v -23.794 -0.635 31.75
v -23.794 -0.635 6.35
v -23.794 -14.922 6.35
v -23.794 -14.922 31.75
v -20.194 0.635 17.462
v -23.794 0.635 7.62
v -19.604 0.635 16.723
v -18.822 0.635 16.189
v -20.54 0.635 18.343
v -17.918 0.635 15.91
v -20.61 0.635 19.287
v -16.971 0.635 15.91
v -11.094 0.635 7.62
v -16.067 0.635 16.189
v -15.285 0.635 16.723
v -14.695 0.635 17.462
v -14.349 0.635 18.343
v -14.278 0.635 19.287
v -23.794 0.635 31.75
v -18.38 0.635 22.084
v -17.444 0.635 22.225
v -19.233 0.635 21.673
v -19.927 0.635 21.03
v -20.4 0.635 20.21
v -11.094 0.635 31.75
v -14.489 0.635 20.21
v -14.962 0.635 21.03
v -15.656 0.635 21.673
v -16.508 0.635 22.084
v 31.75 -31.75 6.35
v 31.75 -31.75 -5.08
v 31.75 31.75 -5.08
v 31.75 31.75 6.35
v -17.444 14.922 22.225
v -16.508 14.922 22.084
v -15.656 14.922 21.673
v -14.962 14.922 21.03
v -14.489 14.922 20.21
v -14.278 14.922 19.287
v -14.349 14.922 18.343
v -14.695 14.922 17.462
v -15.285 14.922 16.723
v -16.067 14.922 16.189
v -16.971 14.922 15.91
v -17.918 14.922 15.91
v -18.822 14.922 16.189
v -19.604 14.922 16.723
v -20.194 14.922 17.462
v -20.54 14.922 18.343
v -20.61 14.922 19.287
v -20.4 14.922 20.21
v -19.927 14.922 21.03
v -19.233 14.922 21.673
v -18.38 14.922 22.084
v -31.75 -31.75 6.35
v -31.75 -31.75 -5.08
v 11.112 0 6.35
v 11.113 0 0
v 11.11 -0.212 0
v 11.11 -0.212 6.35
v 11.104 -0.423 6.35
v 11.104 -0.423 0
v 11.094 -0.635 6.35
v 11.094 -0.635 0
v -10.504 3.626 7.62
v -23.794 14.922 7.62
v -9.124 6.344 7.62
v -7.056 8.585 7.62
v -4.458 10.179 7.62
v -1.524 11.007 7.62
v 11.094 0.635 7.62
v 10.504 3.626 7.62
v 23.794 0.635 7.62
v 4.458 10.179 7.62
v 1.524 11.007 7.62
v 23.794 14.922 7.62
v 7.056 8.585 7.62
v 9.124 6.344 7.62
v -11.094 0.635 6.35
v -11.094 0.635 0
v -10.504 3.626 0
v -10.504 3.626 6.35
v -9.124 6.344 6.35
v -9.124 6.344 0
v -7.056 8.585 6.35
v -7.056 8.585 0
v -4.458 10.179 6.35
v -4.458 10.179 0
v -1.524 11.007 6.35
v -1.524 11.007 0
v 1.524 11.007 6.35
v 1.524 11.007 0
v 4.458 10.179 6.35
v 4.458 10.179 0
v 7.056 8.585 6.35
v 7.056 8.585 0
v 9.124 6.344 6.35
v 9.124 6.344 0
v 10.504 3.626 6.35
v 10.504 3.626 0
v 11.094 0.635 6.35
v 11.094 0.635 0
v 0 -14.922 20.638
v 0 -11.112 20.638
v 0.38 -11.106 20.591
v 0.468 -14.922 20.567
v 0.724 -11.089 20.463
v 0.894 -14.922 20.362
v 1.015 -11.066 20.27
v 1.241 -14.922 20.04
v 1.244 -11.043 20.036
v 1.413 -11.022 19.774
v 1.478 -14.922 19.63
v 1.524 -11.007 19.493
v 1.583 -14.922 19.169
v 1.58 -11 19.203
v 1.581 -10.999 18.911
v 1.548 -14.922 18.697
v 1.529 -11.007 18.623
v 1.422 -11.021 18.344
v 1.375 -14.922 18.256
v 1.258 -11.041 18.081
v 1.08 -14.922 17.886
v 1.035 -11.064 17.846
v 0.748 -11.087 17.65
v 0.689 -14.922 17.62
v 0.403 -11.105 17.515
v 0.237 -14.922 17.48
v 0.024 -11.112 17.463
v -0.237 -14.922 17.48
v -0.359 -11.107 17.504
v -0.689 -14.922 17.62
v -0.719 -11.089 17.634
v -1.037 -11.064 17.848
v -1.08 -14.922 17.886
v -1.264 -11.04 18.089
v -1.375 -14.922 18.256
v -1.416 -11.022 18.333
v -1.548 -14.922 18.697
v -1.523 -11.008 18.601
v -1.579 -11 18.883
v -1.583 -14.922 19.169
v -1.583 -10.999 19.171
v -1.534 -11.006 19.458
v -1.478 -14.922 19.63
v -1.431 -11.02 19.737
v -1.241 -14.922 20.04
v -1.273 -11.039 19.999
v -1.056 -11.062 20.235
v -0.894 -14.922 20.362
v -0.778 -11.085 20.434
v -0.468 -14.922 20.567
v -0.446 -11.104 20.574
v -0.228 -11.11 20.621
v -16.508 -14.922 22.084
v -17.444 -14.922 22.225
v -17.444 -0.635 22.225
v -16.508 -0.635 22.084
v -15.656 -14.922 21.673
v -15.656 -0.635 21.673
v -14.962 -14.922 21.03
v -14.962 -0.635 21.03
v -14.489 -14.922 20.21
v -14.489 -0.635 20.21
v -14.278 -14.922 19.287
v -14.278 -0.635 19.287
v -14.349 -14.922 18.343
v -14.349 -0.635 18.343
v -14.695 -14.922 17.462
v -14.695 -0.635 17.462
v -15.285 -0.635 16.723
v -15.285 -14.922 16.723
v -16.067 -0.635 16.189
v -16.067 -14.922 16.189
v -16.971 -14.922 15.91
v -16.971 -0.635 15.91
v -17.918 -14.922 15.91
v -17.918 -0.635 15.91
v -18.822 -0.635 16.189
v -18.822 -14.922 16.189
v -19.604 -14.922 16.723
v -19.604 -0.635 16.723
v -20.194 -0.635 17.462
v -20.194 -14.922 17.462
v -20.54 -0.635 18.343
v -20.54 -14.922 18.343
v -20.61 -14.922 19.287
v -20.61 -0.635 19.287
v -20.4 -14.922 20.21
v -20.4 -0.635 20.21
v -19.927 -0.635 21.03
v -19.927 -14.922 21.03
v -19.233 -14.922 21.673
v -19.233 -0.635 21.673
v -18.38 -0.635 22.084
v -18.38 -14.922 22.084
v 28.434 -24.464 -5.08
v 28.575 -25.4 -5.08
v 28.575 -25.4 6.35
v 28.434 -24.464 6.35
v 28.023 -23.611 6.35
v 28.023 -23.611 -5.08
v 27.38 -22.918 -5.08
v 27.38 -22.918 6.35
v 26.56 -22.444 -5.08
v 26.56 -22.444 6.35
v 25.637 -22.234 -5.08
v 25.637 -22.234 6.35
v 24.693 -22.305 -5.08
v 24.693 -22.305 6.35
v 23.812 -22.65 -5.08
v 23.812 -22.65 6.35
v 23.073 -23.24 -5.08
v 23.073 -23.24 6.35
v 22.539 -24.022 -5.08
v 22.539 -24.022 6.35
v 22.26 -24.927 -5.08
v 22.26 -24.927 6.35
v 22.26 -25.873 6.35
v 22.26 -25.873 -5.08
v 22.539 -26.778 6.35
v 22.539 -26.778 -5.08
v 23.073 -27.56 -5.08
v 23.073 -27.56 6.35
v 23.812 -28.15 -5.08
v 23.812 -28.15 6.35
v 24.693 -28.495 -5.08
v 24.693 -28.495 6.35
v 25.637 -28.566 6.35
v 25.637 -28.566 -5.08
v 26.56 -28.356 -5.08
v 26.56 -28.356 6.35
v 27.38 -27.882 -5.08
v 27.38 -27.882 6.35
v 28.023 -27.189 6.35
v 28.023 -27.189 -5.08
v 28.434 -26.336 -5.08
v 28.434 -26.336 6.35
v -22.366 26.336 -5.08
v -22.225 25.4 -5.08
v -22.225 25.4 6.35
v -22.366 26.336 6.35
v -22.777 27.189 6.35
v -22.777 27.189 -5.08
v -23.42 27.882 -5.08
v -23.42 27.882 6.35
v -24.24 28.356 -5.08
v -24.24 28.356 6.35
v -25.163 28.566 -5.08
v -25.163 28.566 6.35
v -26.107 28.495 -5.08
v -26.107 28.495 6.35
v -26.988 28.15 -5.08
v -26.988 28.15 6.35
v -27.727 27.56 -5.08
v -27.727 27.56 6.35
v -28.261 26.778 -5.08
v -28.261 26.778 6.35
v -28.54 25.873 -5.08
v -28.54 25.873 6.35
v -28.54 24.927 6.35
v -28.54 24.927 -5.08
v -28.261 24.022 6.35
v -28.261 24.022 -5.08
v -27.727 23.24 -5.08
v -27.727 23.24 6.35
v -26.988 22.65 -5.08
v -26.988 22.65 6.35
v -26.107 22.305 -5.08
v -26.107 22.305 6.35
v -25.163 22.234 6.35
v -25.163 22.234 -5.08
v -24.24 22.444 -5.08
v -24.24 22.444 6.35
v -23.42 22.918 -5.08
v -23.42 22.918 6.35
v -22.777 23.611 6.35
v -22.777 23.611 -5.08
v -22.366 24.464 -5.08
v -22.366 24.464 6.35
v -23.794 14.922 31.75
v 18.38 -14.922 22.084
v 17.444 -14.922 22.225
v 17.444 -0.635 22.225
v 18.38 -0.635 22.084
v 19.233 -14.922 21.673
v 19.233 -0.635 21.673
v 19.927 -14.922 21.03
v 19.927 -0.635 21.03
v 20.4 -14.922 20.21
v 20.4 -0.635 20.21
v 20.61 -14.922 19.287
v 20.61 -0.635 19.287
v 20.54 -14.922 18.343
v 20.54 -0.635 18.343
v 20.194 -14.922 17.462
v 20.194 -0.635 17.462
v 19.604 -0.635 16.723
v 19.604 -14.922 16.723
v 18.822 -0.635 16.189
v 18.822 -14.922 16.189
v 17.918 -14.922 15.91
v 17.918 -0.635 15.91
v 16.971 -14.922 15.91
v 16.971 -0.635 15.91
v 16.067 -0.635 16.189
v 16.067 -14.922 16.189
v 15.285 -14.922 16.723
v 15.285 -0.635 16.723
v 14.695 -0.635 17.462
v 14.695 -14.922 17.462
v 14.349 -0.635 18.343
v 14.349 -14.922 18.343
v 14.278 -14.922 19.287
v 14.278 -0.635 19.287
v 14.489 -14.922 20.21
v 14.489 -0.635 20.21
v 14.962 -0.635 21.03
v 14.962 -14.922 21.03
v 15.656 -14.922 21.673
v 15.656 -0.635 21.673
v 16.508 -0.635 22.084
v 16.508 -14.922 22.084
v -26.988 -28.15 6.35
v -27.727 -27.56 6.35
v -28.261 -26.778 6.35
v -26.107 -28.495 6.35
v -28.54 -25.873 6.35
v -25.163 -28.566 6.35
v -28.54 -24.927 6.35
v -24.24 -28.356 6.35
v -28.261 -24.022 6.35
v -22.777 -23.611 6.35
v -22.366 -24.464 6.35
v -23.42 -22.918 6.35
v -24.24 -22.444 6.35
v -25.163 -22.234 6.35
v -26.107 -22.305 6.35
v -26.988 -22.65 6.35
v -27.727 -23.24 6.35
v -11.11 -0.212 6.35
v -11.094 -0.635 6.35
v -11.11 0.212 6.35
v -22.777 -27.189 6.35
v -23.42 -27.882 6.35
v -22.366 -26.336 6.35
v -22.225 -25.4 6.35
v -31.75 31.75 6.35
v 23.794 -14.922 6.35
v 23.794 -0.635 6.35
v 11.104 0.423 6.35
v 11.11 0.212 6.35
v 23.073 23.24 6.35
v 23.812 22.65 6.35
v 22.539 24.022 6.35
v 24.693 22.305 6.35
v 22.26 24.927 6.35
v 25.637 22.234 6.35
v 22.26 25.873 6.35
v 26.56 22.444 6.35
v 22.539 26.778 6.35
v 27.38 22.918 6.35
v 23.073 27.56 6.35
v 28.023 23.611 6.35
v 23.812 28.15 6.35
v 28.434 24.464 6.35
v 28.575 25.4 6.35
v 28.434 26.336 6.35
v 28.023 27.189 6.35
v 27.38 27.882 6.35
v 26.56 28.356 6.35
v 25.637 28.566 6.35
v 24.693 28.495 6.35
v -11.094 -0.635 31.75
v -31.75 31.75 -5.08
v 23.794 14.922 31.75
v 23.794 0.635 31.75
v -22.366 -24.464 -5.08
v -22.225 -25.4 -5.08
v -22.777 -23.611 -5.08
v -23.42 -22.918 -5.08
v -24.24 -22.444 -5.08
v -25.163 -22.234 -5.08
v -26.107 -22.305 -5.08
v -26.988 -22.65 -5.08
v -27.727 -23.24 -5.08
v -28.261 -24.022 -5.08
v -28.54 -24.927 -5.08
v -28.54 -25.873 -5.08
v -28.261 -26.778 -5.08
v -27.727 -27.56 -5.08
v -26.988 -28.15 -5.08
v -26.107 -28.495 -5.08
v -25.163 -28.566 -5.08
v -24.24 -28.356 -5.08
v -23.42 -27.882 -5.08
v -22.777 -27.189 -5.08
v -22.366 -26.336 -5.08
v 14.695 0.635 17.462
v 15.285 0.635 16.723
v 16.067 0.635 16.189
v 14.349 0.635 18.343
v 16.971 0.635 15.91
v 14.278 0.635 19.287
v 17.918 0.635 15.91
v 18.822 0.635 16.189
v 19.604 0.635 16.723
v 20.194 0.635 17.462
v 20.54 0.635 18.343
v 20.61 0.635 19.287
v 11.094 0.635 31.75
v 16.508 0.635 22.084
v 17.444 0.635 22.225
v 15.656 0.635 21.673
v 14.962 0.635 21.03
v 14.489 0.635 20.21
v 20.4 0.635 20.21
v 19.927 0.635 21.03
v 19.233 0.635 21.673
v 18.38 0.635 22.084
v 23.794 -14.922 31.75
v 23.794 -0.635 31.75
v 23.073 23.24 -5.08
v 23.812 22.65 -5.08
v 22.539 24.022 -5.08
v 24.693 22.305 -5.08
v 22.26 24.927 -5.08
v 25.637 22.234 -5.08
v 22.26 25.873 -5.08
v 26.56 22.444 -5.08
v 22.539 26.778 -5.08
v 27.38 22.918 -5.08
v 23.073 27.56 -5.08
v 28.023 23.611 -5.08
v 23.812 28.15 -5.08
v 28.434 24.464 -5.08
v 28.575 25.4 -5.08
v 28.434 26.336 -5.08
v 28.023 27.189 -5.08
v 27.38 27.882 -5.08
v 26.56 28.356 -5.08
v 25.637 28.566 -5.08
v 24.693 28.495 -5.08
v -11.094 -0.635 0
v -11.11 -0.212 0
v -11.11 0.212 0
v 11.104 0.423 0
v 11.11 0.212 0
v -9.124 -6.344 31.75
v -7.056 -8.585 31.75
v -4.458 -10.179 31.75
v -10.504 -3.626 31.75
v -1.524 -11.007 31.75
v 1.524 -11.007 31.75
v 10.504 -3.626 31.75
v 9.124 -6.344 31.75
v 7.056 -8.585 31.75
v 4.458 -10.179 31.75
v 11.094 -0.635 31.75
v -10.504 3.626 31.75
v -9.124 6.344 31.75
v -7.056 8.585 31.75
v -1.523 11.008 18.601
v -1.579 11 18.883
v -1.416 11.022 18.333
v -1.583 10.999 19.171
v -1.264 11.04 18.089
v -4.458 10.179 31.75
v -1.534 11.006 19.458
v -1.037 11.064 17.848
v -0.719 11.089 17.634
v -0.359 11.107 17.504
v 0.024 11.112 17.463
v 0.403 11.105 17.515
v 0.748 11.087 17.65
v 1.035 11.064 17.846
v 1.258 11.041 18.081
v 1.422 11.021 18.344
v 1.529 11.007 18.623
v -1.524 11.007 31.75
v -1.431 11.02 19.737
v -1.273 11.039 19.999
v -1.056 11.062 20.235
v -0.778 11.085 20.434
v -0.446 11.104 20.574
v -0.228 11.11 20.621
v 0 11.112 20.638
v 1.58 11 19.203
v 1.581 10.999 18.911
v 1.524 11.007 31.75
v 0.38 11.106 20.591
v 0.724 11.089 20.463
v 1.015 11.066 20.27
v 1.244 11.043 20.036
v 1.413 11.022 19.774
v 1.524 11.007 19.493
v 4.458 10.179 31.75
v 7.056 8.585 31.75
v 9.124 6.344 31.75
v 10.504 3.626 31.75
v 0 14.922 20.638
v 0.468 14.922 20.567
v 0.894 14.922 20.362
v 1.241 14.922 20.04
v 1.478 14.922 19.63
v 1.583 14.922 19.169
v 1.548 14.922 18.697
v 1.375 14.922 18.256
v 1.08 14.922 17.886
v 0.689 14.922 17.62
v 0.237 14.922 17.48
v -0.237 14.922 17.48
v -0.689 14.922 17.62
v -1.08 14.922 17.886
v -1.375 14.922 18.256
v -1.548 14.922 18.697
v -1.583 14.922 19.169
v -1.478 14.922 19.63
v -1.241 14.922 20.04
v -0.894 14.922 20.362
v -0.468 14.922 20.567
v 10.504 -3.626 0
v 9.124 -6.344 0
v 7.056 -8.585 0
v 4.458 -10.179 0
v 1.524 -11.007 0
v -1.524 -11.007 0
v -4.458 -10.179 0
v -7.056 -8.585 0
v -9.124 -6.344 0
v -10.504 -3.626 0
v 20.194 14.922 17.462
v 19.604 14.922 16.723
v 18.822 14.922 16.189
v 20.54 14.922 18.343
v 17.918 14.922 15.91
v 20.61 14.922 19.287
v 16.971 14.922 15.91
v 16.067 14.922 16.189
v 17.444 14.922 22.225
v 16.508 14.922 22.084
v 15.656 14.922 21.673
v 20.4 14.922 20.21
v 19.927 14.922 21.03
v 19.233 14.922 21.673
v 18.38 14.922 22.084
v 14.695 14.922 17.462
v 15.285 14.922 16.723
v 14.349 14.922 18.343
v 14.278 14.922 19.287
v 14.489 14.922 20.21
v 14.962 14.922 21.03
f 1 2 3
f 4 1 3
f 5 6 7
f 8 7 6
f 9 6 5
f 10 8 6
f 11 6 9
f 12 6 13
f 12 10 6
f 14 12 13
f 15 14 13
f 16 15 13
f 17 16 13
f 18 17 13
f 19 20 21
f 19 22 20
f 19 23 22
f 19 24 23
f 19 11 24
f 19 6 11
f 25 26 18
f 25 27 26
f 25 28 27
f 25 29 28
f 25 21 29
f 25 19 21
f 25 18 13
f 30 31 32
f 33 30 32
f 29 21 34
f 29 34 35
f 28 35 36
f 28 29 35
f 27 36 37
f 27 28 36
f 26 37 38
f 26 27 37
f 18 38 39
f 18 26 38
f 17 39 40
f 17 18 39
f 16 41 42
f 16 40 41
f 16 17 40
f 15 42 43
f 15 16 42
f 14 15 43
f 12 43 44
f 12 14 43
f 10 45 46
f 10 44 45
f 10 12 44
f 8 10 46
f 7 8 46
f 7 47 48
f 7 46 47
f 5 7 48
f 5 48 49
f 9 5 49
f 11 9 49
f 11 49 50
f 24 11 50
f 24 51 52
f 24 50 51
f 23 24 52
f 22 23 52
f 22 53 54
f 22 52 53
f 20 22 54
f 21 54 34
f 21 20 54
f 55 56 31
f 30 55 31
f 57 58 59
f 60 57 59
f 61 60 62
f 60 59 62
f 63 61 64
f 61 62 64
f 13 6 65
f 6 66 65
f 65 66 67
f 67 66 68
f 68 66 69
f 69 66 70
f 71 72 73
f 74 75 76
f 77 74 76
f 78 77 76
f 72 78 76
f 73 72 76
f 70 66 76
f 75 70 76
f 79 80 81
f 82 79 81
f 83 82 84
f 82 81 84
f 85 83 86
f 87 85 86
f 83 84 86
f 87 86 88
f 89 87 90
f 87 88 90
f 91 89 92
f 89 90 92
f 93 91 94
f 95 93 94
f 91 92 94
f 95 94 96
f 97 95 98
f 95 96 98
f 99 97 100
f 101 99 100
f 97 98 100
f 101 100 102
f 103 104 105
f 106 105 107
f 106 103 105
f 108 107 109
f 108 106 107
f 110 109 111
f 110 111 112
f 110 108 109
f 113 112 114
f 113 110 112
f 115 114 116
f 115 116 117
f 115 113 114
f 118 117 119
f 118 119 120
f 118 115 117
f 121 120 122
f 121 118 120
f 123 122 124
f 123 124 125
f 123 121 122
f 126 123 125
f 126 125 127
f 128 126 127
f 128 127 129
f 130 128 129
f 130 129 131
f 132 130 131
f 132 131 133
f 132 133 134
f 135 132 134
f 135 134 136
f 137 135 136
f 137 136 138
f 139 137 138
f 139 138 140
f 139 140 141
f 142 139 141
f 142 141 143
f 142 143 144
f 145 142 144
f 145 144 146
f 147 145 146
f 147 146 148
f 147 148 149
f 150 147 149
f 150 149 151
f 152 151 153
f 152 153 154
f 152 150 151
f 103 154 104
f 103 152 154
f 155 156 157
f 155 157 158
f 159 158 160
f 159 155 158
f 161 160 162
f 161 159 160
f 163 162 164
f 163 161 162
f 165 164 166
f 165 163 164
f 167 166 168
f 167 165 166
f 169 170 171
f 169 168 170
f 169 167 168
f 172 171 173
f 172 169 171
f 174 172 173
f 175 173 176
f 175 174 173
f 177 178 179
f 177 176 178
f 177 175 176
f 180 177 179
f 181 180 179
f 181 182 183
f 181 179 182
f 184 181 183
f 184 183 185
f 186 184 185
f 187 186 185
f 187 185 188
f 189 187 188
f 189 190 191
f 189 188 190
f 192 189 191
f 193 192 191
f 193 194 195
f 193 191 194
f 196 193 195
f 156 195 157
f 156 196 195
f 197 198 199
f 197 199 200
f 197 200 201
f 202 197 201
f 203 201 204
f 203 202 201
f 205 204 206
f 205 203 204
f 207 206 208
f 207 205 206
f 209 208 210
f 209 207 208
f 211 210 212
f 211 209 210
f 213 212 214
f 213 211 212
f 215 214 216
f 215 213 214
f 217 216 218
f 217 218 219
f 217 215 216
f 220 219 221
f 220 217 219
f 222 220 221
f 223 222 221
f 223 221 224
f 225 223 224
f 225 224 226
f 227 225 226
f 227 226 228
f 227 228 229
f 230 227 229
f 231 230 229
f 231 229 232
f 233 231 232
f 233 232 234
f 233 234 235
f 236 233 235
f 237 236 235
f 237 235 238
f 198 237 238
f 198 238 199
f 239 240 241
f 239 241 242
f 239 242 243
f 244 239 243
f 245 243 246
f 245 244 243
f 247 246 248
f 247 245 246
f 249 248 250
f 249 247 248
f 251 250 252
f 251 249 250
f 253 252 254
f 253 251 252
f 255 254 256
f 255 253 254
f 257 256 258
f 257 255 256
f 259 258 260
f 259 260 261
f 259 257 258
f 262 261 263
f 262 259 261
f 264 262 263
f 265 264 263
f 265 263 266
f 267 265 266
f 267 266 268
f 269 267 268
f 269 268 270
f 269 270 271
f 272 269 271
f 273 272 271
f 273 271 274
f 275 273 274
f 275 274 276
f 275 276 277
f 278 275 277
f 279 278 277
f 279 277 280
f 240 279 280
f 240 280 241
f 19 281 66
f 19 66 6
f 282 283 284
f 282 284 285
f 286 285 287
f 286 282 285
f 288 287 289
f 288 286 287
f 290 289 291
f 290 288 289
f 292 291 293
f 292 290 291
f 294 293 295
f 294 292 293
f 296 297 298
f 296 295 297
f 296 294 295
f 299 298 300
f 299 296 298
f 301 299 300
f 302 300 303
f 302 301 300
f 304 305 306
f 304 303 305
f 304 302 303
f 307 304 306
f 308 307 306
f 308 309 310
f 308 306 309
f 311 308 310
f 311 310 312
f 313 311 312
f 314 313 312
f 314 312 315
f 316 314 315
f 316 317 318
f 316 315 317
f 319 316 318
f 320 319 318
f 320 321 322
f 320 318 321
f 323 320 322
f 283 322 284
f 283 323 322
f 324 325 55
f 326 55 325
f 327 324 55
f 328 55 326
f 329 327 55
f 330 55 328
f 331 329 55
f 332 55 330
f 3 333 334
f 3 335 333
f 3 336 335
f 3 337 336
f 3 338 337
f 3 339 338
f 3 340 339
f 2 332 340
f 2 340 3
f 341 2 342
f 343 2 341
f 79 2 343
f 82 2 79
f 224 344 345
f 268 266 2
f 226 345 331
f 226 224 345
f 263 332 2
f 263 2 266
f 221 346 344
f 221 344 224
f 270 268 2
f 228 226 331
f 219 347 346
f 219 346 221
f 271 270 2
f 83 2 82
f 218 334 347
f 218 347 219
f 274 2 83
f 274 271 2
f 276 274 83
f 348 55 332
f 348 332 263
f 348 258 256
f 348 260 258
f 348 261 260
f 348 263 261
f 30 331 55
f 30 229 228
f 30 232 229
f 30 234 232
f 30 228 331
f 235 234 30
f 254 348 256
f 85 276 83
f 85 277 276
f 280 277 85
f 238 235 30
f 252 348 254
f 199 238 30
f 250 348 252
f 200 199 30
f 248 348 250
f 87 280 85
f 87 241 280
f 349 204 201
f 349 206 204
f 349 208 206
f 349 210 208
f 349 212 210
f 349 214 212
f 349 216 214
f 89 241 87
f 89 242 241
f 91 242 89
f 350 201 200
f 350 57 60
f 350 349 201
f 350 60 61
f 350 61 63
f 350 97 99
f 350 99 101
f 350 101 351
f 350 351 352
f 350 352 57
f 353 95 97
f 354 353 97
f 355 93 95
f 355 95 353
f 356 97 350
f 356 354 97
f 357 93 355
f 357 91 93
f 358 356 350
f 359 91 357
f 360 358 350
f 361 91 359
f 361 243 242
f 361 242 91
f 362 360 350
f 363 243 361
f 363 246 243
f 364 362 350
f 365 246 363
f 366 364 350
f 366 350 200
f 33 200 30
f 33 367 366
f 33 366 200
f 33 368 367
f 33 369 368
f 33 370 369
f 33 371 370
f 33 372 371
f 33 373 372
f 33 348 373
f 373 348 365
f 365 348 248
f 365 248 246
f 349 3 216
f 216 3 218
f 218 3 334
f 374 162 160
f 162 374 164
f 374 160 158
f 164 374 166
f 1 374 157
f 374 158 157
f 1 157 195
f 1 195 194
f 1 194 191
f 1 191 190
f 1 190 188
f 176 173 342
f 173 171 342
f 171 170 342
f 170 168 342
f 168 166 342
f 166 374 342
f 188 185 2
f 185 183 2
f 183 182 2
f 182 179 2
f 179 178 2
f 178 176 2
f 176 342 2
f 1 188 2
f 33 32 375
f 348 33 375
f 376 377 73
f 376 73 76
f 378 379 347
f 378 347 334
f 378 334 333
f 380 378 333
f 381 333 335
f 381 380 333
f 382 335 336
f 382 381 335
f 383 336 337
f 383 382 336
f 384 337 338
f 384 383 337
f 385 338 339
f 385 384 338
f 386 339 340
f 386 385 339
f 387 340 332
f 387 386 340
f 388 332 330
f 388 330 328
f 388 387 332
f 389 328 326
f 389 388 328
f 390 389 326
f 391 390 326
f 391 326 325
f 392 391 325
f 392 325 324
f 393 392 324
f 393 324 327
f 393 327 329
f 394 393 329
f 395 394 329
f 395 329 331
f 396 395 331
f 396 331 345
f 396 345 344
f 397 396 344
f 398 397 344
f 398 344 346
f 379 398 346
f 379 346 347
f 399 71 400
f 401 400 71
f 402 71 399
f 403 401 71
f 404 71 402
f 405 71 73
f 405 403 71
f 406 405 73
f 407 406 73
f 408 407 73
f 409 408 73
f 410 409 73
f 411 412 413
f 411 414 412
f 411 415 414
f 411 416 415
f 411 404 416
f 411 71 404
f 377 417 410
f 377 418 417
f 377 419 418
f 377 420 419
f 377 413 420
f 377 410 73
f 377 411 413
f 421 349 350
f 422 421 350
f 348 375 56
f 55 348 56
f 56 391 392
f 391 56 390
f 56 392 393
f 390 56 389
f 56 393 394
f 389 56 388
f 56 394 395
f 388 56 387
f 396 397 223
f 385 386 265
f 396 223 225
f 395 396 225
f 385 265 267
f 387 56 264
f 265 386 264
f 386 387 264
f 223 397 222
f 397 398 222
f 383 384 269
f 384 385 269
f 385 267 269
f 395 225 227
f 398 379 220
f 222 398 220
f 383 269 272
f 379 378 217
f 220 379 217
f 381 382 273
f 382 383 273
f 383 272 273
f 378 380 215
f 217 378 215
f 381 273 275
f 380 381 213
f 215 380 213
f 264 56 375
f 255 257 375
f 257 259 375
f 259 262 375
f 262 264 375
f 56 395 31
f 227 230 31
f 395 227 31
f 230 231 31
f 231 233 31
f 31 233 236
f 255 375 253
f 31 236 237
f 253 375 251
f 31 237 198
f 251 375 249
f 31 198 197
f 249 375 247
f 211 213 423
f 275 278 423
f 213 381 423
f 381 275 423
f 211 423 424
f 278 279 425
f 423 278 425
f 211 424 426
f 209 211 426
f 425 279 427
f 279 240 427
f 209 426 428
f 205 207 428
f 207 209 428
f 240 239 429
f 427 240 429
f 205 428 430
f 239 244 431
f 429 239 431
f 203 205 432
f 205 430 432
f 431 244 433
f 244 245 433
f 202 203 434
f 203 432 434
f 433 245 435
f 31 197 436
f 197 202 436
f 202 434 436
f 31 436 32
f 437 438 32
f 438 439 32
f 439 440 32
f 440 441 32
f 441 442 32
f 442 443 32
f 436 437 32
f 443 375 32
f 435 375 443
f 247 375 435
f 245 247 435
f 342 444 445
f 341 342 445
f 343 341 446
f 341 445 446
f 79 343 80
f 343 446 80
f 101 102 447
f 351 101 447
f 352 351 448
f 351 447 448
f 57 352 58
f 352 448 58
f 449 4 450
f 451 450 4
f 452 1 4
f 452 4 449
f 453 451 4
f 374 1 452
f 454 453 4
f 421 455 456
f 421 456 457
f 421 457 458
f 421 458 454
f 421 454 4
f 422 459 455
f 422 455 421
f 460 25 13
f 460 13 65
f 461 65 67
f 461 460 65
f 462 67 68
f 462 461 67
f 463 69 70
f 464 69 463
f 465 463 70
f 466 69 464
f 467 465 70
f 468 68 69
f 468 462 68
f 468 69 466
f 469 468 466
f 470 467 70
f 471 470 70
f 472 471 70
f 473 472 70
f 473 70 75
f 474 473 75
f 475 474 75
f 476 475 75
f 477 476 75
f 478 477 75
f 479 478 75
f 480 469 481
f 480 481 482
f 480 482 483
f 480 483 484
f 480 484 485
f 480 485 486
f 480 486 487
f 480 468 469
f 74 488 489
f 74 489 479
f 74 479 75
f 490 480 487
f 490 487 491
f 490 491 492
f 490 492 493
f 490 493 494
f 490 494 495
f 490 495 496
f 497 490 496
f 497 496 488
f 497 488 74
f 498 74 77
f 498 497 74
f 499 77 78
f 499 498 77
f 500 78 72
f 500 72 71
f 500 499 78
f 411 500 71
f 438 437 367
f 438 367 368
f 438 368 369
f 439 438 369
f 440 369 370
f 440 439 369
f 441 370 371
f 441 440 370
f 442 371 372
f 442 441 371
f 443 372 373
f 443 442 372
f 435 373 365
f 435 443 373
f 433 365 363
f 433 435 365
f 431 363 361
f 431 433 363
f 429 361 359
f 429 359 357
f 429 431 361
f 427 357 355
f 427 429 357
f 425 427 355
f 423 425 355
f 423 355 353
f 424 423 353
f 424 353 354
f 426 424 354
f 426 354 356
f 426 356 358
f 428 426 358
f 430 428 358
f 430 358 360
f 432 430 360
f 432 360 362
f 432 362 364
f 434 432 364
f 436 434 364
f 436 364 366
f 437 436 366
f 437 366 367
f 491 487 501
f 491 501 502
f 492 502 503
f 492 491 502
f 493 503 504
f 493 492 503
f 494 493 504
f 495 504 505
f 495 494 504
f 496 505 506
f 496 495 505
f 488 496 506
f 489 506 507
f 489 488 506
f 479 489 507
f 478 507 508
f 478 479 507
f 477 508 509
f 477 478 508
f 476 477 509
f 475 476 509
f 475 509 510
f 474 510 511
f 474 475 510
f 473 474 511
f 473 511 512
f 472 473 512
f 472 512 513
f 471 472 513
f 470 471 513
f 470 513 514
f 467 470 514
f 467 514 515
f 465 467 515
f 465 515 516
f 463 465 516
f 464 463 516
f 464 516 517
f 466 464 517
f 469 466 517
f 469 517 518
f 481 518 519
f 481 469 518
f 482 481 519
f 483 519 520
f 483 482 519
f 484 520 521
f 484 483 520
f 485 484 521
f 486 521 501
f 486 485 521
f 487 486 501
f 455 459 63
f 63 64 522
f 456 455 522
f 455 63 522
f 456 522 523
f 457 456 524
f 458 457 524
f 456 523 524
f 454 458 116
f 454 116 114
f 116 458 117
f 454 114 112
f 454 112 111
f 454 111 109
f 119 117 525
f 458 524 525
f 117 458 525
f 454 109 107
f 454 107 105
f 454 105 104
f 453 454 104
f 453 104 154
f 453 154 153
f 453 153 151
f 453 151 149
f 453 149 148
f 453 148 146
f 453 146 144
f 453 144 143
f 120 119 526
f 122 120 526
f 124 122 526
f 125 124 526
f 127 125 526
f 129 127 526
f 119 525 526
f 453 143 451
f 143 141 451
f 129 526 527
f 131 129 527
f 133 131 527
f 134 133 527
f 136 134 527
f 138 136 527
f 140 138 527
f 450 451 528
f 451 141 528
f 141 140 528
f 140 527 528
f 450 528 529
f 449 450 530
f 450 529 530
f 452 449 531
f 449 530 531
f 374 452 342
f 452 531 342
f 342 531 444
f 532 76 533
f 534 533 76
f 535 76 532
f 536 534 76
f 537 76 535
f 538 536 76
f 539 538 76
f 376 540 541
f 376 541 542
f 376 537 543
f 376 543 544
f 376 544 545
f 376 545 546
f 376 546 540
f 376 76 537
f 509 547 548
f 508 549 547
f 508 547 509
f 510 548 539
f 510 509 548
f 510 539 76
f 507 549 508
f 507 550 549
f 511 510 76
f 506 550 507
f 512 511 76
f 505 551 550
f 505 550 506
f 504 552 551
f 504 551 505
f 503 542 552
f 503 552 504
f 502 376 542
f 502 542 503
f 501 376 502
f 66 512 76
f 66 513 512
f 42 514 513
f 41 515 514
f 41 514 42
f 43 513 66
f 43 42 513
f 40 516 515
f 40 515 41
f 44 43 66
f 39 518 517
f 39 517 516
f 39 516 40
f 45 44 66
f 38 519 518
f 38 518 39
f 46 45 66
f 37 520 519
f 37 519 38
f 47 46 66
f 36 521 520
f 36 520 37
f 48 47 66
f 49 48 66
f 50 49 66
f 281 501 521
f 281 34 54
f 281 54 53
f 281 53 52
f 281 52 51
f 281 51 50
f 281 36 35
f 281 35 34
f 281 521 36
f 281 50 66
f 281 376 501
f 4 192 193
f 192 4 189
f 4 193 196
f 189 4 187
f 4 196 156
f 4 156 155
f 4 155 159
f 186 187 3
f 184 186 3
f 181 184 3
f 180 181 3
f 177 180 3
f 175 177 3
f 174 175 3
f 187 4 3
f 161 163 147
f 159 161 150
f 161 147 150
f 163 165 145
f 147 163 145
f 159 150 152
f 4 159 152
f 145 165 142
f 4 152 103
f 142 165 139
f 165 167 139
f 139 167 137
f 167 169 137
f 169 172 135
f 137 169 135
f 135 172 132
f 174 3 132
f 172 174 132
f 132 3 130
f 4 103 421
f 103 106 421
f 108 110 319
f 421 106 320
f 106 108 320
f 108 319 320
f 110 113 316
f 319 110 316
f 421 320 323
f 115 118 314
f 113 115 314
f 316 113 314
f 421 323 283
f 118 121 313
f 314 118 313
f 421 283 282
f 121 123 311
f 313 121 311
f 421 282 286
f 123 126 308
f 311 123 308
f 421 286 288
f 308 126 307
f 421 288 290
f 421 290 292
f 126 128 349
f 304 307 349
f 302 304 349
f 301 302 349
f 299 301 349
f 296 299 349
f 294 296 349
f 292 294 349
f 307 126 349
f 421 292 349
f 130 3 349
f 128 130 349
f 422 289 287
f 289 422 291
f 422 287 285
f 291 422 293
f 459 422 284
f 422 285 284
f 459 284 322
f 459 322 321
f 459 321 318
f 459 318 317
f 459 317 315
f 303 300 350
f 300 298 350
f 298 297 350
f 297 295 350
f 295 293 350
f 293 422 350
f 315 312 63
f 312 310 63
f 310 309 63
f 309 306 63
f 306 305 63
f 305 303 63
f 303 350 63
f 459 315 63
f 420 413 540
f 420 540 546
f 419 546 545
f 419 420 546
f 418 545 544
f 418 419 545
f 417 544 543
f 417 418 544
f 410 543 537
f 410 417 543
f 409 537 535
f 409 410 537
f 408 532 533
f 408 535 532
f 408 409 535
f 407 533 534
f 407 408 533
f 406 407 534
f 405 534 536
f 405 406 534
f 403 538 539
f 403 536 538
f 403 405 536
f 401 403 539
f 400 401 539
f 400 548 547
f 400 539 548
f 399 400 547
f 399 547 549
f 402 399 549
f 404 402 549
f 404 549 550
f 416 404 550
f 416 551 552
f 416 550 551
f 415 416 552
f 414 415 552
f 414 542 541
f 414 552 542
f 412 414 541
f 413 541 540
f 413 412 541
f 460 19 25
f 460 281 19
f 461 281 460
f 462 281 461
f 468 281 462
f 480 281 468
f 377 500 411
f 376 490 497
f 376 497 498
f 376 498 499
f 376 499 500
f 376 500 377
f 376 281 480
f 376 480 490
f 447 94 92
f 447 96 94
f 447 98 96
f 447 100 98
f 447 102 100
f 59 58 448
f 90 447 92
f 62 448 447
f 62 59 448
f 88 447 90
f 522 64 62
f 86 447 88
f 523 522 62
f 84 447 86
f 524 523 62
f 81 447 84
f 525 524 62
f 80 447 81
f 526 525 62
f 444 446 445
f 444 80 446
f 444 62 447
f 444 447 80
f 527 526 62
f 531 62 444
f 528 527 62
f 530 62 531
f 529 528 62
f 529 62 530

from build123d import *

# Parameters (mm, degrees)
SKETCH1_R               = 3.175
BOSS_EXTRUDE1_DEPTH     = 6.35
BOSS_EXTRUDE2_DEPTH     = 31.75
BOSS_EXTRUDE3_START     = 31.75
BOSS_EXTRUDE3_DEPTH     = 24.13
CUT_EXTRUDE1_DEPTH      = 55.99261314
CUT_EXTRUDE1_DEPTH_BACK = 55.99261314
SKETCH2_R               = 3.175
SKETCH2_R_2             = 1.5875
BOSS_EXTRUDE4_START     = -5.08
SKETCH1_5_R             = 3.175
SKETCH1_5_R_2           = 11.1125
BOSS_EXTRUDE4_DEPTH     = 5.08


with BuildPart() as part:
    # Sketch1 → Boss-Extrude1 (new body)
    # profile 1 of 3: a face of its own
    with BuildSketch(Plane.XY):
        Polygon((31.75, 31.75), (-31.75, 31.75), (-31.75, 0), (-31.75, -0.635), (-31.75, -31.75), (31.75, -31.75), align=None)
        with Locations((-25.4, -25.4)):
            Circle(SKETCH1_R, mode=Mode.SUBTRACT)
        with Locations((25.4, -25.4)):
            Circle(SKETCH1_R, mode=Mode.SUBTRACT)
        with Locations((-25.4, 25.4)):
            Circle(SKETCH1_R, mode=Mode.SUBTRACT)
        with BuildLine():
            Line((-23.794342308, -0.635), (-11.094342308, -0.635))
            ThreePointArc((-11.094342308, -0.635), (-11.1125, 0), (-11.094342308, 0.635))
            Line((-11.094342308, 0.635), (-23.794342308, 0.635))
            Line((-23.794342308, 0.635), (-23.794342308, 14.9225))
            Line((-23.794342308, 14.9225), (23.794342308, 14.9225))
            Line((23.794342308, 14.9225), (23.794342308, 0.635))
            Line((23.794342308, 0.635), (11.094342308, 0.635))
            ThreePointArc((11.094342308, 0.635), (11.107959649, 0.317629777), (11.1125, 0))
            ThreePointArc((11.1125, 0), (11.107959649, -0.317629777), (11.094342308, -0.635))
            Line((11.094342308, -0.635), (23.794342308, -0.635))
            Line((23.794342308, -0.635), (23.794342308, -14.9225))
            Line((23.794342308, -14.9225), (-23.794342308, -14.9225))
            Line((-23.794342308, -14.9225), (-23.794342308, -0.635))
        make_face(mode=Mode.SUBTRACT)
        with Locations((25.4, 25.4)):
            Circle(SKETCH1_R, mode=Mode.SUBTRACT)
    # profile 2 of 3: a face of its own
    with BuildSketch(Plane.XY):
        with BuildLine():
            Line((-23.794342308, 0.635), (-11.094342308, 0.635))
            ThreePointArc((-11.094342308, 0.635), (0, 11.1125), (11.094342308, 0.635))
            Line((11.094342308, 0.635), (23.794342308, 0.635))
            Line((23.794342308, 0.635), (23.794342308, 14.9225))
            Line((23.794342308, 14.9225), (-23.794342308, 14.9225))
            Line((-23.794342308, 14.9225), (-23.794342308, 0.635))
        make_face()
    # profile 3 of 3: a face of its own
    with BuildSketch(Plane.XY):
        with BuildLine():
            ThreePointArc((11.094342308, -0.635), (0, -11.1125), (-11.094342308, -0.635))
            Line((-11.094342308, -0.635), (-23.794342308, -0.635))
            Line((-23.794342308, -0.635), (-23.794342308, -14.9225))
            Line((-23.794342308, -14.9225), (23.794342308, -14.9225))
            Line((23.794342308, -14.9225), (23.794342308, -0.635))
            Line((23.794342308, -0.635), (11.094342308, -0.635))
        make_face()
    extrude(amount=BOSS_EXTRUDE1_DEPTH)

    # Sketch1<3> → Boss-Extrude2 (add)
    with BuildSketch(Plane.XY):
        with BuildLine():
            ThreePointArc((11.094342308, -0.635), (0, -11.1125), (-11.094342308, -0.635))
            Line((-11.094342308, -0.635), (-23.794342308, -0.635))
            Line((-23.794342308, -0.635), (-23.794342308, -14.9225))
            Line((-23.794342308, -14.9225), (23.794342308, -14.9225))
            Line((23.794342308, -14.9225), (23.794342308, -0.635))
            Line((23.794342308, -0.635), (11.094342308, -0.635))
        make_face()
    extrude(amount=BOSS_EXTRUDE2_DEPTH)


with BuildPart() as body_2:
    # Sketch1<4> → Boss-Extrude3 (new body)
    with BuildSketch(Plane.XY.offset(BOSS_EXTRUDE3_START)):
        with BuildLine():
            Line((-23.794342308, 0.635), (-11.094342308, 0.635))
            ThreePointArc((-11.094342308, 0.635), (0, 11.1125), (11.094342308, 0.635))
            Line((11.094342308, 0.635), (23.794342308, 0.635))
            Line((23.794342308, 0.635), (23.794342308, 14.9225))
            Line((23.794342308, 14.9225), (-23.794342308, 14.9225))
            Line((-23.794342308, 14.9225), (-23.794342308, 0.635))
        make_face()
    extrude(amount=-BOSS_EXTRUDE3_DEPTH)


with BuildPart() as cut_extrude1_tool:
    # Sketch2 → Cut-Extrude1 (new, two sides: drawn at the far end of the back side and taken through both)
    with BuildSketch(Plane(origin=(0, 0, 0), x_dir=(1, 0, 0), z_dir=(0, 1, 0)).offset(-CUT_EXTRUDE1_DEPTH_BACK)):
        with Locations(Location((17.444342308, -19.05, 0), (0, 0, 270))):
            Circle(SKETCH2_R)
        with Locations(Location((-17.444342308, -19.05, 0), (0, 0, 270))):
            Circle(SKETCH2_R)
        with Locations(Location((0, -19.05, 0), (0, 0, 270))):
            Circle(SKETCH2_R_2)
    extrude(amount=CUT_EXTRUDE1_DEPTH + CUT_EXTRUDE1_DEPTH_BACK)


with BuildPart() as part_1:
    add(part.part)

    # Cut-Extrude1: cut by cut_extrude1_tool
    add(cut_extrude1_tool.part, mode=Mode.SUBTRACT)

    # Sketch1<5> → Boss-Extrude4 (add)
    # profile 1 of 4: a face of its own
    with BuildSketch(Plane.XY.offset(BOSS_EXTRUDE4_START)):
        Polygon((31.75, 31.75), (-31.75, 31.75), (-31.75, 0), (-31.75, -0.635), (-31.75, -31.75), (31.75, -31.75), align=None)
        with Locations((-25.4, -25.4)):
            Circle(SKETCH1_5_R, mode=Mode.SUBTRACT)
        with Locations((25.4, -25.4)):
            Circle(SKETCH1_5_R, mode=Mode.SUBTRACT)
        with Locations((-25.4, 25.4)):
            Circle(SKETCH1_5_R, mode=Mode.SUBTRACT)
        with BuildLine():
            Line((-23.794342308, -0.635), (-11.094342308, -0.635))
            ThreePointArc((-11.094342308, -0.635), (-11.1125, 0), (-11.094342308, 0.635))
            Line((-11.094342308, 0.635), (-23.794342308, 0.635))
            Line((-23.794342308, 0.635), (-23.794342308, 14.9225))
            Line((-23.794342308, 14.9225), (23.794342308, 14.9225))
            Line((23.794342308, 14.9225), (23.794342308, 0.635))
            Line((23.794342308, 0.635), (11.094342308, 0.635))
            ThreePointArc((11.094342308, 0.635), (11.107959649, 0.317629777), (11.1125, 0))
            ThreePointArc((11.1125, 0), (11.107959649, -0.317629777), (11.094342308, -0.635))
            Line((11.094342308, -0.635), (23.794342308, -0.635))
            Line((23.794342308, -0.635), (23.794342308, -14.9225))
            Line((23.794342308, -14.9225), (-23.794342308, -14.9225))
            Line((-23.794342308, -14.9225), (-23.794342308, -0.635))
        make_face(mode=Mode.SUBTRACT)
        with Locations((25.4, 25.4)):
            Circle(SKETCH1_5_R, mode=Mode.SUBTRACT)
    # profile 2 of 4: a face of its own
    with BuildSketch(Plane.XY.offset(BOSS_EXTRUDE4_START)):
        with BuildLine():
            Line((-23.794342308, 0.635), (-11.094342308, 0.635))
            ThreePointArc((-11.094342308, 0.635), (0, 11.1125), (11.094342308, 0.635))
            Line((11.094342308, 0.635), (23.794342308, 0.635))
            Line((23.794342308, 0.635), (23.794342308, 14.9225))
            Line((23.794342308, 14.9225), (-23.794342308, 14.9225))
            Line((-23.794342308, 14.9225), (-23.794342308, 0.635))
        make_face()
    # profile 3 of 4: a face of its own
    with BuildSketch(Plane.XY.offset(BOSS_EXTRUDE4_START)):
        with Locations(Location((0, 0, 0), (0, 0, 183.27582896))):
            Circle(SKETCH1_5_R_2)
    # profile 4 of 4: a face of its own
    with BuildSketch(Plane.XY.offset(BOSS_EXTRUDE4_START)):
        with BuildLine():
            ThreePointArc((11.094342308, -0.635), (0, -11.1125), (-11.094342308, -0.635))
            Line((-11.094342308, -0.635), (-23.794342308, -0.635))
            Line((-23.794342308, -0.635), (-23.794342308, -14.9225))
            Line((-23.794342308, -14.9225), (23.794342308, -14.9225))
            Line((23.794342308, -14.9225), (23.794342308, -0.635))
            Line((23.794342308, -0.635), (11.094342308, -0.635))
        make_face()
    extrude(amount=BOSS_EXTRUDE4_DEPTH)


with BuildPart() as body_2_1:
    add(body_2.part)

    # Cut-Extrude1: cut by cut_extrude1_tool
    add(cut_extrude1_tool.part, mode=Mode.SUBTRACT)


solid = Compound([part_1.part, body_2_1.part])
